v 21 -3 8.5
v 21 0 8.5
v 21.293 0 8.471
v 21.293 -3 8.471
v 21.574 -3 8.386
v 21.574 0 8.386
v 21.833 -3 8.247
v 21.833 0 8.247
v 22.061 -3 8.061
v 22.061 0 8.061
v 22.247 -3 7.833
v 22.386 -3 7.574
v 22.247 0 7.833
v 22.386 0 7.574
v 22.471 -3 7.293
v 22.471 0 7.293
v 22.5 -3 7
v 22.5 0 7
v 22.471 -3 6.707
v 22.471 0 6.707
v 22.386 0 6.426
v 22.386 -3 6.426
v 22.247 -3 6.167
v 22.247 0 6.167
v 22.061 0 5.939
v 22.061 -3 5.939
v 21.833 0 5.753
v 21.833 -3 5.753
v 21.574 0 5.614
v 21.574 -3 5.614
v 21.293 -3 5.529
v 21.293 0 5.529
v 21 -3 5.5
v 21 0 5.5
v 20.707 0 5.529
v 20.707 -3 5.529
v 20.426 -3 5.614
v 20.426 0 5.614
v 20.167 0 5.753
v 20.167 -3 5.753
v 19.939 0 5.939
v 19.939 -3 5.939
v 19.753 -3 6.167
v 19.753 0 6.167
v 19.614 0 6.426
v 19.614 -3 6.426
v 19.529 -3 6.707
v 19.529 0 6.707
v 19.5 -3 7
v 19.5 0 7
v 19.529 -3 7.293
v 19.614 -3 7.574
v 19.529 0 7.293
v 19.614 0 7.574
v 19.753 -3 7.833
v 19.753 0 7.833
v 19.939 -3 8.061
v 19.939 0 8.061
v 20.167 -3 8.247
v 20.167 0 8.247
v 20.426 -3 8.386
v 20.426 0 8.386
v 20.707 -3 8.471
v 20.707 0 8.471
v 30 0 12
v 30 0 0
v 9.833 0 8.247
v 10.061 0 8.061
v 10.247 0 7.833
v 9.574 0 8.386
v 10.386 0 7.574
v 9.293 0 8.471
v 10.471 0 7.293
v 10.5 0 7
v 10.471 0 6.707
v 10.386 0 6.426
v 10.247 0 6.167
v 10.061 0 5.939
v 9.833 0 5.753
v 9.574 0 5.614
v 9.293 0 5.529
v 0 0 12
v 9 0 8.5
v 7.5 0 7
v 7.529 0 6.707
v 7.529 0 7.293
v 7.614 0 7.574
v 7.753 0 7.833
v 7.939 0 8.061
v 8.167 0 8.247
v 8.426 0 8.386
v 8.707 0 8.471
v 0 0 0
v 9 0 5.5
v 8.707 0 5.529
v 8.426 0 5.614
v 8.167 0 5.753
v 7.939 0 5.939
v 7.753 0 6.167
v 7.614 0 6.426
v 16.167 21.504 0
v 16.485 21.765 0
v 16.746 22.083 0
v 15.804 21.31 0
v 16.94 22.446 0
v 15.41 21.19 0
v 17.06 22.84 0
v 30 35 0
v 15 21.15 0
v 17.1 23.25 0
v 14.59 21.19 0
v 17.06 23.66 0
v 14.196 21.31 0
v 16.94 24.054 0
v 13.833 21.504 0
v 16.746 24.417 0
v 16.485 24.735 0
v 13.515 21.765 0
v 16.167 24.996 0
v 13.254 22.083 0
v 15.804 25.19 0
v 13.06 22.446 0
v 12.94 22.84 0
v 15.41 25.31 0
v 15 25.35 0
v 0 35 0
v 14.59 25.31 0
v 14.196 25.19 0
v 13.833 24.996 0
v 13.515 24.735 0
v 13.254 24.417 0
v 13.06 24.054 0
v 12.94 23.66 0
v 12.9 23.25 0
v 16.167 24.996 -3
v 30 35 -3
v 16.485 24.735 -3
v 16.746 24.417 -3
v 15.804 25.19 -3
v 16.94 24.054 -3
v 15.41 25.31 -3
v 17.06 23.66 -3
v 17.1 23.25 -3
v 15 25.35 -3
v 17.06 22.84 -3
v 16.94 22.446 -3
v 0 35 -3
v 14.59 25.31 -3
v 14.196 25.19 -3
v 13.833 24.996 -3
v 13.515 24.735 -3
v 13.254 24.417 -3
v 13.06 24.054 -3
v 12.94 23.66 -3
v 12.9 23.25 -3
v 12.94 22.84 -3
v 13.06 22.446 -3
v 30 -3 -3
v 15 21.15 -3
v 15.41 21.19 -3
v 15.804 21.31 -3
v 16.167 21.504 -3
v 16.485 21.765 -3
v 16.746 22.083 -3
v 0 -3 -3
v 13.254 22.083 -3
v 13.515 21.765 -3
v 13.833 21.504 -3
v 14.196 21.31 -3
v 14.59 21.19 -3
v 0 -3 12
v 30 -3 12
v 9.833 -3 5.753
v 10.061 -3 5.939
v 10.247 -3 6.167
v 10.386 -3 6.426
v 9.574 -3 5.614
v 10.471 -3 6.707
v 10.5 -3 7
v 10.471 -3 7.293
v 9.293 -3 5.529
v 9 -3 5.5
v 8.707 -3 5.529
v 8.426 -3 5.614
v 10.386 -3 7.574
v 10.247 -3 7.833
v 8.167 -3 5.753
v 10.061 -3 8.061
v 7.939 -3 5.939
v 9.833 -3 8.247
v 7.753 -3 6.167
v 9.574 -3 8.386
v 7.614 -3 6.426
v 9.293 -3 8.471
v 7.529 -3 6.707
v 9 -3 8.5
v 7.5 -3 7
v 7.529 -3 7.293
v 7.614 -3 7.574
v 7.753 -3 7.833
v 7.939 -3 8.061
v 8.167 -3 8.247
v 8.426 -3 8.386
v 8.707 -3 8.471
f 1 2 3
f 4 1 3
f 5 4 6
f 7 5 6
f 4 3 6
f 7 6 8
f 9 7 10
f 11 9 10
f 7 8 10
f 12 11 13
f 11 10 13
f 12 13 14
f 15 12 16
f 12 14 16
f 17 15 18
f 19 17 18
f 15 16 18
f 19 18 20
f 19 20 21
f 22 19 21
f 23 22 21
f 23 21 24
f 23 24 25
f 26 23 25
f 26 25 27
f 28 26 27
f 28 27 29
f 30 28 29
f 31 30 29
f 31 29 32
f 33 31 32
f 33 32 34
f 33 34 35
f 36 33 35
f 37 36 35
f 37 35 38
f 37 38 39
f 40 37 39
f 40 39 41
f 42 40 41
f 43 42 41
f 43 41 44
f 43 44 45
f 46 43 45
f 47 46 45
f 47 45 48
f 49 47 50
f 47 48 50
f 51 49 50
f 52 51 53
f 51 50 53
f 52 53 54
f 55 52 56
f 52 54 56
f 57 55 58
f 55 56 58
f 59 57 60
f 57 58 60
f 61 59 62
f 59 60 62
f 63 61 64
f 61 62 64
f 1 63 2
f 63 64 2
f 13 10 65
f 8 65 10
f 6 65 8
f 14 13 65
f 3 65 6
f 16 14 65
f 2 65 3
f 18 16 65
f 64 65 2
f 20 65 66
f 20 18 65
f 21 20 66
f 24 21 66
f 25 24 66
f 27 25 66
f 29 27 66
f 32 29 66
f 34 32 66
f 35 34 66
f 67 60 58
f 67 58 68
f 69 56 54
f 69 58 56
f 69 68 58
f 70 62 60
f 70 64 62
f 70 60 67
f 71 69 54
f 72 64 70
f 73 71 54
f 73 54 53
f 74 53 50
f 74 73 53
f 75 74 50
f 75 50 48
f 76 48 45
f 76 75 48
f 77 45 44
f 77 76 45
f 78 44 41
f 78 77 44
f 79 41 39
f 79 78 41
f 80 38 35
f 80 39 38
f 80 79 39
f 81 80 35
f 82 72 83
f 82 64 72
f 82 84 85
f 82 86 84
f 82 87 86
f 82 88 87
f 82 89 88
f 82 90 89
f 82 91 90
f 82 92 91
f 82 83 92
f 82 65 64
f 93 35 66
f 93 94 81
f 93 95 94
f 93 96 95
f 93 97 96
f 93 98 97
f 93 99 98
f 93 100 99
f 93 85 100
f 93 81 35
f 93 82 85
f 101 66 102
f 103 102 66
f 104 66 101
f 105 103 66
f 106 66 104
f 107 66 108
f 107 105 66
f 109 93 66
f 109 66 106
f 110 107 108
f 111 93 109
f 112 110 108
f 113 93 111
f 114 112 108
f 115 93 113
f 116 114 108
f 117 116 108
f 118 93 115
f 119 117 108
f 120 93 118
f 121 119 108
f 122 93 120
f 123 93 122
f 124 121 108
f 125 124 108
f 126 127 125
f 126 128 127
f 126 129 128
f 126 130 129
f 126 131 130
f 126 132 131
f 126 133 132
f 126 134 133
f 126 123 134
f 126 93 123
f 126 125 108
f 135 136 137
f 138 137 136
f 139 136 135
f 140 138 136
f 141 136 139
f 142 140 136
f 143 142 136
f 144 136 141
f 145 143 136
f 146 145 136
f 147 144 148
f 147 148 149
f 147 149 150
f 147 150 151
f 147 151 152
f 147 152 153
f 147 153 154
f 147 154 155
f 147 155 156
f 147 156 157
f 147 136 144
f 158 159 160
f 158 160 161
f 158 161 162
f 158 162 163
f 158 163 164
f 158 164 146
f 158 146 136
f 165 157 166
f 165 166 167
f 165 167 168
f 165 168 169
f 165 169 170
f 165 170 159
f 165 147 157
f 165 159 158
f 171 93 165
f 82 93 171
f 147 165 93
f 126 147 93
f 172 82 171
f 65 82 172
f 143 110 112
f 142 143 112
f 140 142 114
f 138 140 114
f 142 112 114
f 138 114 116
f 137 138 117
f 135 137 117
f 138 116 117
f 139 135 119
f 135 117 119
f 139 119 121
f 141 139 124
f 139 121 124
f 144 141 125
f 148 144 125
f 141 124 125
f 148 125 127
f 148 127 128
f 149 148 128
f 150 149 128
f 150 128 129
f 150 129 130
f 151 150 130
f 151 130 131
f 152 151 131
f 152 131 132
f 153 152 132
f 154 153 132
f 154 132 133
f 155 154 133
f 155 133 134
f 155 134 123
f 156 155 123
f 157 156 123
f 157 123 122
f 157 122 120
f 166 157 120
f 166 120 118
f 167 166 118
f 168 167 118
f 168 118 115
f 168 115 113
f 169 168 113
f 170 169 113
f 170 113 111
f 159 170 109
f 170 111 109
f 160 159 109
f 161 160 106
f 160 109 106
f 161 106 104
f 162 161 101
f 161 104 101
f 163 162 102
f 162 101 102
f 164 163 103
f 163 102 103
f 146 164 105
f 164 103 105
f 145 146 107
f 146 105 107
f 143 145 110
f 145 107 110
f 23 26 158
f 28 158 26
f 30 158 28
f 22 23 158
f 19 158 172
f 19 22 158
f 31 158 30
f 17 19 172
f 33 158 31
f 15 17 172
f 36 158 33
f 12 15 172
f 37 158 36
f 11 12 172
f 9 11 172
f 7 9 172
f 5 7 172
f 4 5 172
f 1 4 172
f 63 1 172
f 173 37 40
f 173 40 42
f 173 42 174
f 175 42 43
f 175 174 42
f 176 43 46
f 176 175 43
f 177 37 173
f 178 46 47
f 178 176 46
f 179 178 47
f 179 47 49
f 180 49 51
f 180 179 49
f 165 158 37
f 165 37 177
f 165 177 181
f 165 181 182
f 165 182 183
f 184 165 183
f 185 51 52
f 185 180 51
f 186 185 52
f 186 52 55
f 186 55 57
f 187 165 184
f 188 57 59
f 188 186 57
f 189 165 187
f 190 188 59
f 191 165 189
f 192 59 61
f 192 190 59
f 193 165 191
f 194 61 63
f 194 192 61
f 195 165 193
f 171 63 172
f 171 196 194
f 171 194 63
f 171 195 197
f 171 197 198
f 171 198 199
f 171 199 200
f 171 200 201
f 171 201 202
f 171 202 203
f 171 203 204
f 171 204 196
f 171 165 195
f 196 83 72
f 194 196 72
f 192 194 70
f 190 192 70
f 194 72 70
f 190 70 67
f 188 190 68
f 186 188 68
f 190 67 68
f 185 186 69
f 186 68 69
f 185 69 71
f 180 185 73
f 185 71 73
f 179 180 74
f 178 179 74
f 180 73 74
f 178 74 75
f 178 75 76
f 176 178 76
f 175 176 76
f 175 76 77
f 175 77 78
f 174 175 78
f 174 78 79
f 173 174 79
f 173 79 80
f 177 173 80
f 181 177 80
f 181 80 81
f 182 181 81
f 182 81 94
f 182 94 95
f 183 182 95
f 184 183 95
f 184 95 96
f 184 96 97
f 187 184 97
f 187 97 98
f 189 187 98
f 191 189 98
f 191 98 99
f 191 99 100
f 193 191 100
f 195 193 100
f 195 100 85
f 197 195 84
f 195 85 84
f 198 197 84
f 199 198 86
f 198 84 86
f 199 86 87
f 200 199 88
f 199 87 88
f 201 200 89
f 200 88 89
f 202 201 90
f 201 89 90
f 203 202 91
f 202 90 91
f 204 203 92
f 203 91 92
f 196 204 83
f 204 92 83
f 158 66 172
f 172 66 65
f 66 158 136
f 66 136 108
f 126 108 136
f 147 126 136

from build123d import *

# Parameters (mm, degrees)
EXTRUDE_1_DEPTH     = 30
CUT_EXTRUDE_1_REACH = 59.879
SKETCH_2_R          = 1.5
SKETCH_2_W          = 30
SKETCH_2_H          = 10
SKETCH_3_R          = 2.1
CUT_EXTRUDE_2_DEPTH = 53.440442409
SKETCH_4_W          = 30
SKETCH_4_H          = 3
CUT_EXTRUDE_3_DEPTH = 13


with BuildPart() as part:
    # 草图1 → 凸台-拉伸1 (new body)
    with BuildSketch(Plane(origin=(0, 0, 0), x_dir=(0, 0, -1), z_dir=(1, 0, 0))):
        Polygon((0, 0), (0, 35), (3, 35), (3, -3), (-35, -3), (-35, 0), align=None)
    extrude(amount=EXTRUDE_1_DEPTH)

    # 草图2 → 切除-拉伸1 (cut, up to next)
    with BuildSketch(Plane(origin=(0, 0, 0), x_dir=(1, 0, 0), z_dir=(0, 1, 0)), mode=Mode.PRIVATE) as cut_extrude_1_sk1:
        with Locations(Location((9, -7, 0), (0, 0, 270))):
            Circle(SKETCH_2_R)
    cut_extrude_1_tool1 = extrude(cut_extrude_1_sk1.sketch, amount=-CUT_EXTRUDE_1_REACH, mode=Mode.PRIVATE) & part.part
    # 草图2 → 切除-拉伸1 (cut, up to next)
    with BuildSketch(Plane(origin=(0, 0, 0), x_dir=(1, 0, 0), z_dir=(0, 1, 0)), mode=Mode.PRIVATE) as cut_extrude_1_sk2:
        with Locations(Location((9, -19, 0), (0, 0, 270))):
            Circle(SKETCH_2_R)
    cut_extrude_1_tool2 = extrude(cut_extrude_1_sk2.sketch, amount=-CUT_EXTRUDE_1_REACH, mode=Mode.PRIVATE) & part.part
    # 草图2 → 切除-拉伸1 (cut, up to next)
    with BuildSketch(Plane(origin=(0, 0, 0), x_dir=(1, 0, 0), z_dir=(0, 1, 0)), mode=Mode.PRIVATE) as cut_extrude_1_sk3:
        with Locations(Location((21, -19, 0), (0, 0, 270))):
            Circle(SKETCH_2_R)
    cut_extrude_1_tool3 = extrude(cut_extrude_1_sk3.sketch, amount=-CUT_EXTRUDE_1_REACH, mode=Mode.PRIVATE) & part.part
    # 草图2 → 切除-拉伸1 (cut, up to next)
    with BuildSketch(Plane(origin=(0, 0, 0), x_dir=(1, 0, 0), z_dir=(0, 1, 0)), mode=Mode.PRIVATE) as cut_extrude_1_sk4:
        with Locations(Location((21, -7, 0), (0, 0, 270))):
            Circle(SKETCH_2_R)
    cut_extrude_1_tool4 = extrude(cut_extrude_1_sk4.sketch, amount=-CUT_EXTRUDE_1_REACH, mode=Mode.PRIVATE) & part.part
    # 草图2 → 切除-拉伸1 (cut, up to next)
    with BuildSketch(Plane(origin=(0, 0, 0), x_dir=(1, 0, 0), z_dir=(0, 1, 0)), mode=Mode.PRIVATE) as cut_extrude_1_sk5:
        with Locations((15, -30)):
            Rectangle(SKETCH_2_W, SKETCH_2_H)
    cut_extrude_1_tool5 = extrude(cut_extrude_1_sk5.sketch, amount=-CUT_EXTRUDE_1_REACH, mode=Mode.PRIVATE) & part.part
    add(cut_extrude_1_tool1.solids().sort_by_distance((9, 0, 7))[0], mode=Mode.SUBTRACT)
    add(cut_extrude_1_tool2.solids().sort_by_distance((9, 0, 19))[0], mode=Mode.SUBTRACT)
    add(cut_extrude_1_tool3.solids().sort_by_distance((21, 0, 19))[0], mode=Mode.SUBTRACT)
    add(cut_extrude_1_tool4.solids().sort_by_distance((21, 0, 7))[0], mode=Mode.SUBTRACT)
    add(cut_extrude_1_tool5.solids().sort_by_distance((15, 0, 30))[0], mode=Mode.SUBTRACT)

    # 草图3 → 切除-拉伸2 (cut, through all)
    with BuildSketch(Plane.XY):
        with Locations((15, 23.25)):
            Circle(SKETCH_3_R)
    extrude(amount=-CUT_EXTRUDE_2_DEPTH, mode=Mode.SUBTRACT)

    # 草图4 → 切除-拉伸3 (cut)
    with BuildSketch(Plane.XY.offset(25)):
        with Locations((15, -1.5)):
            Rectangle(SKETCH_4_W, SKETCH_4_H)
    extrude(amount=-CUT_EXTRUDE_3_DEPTH, mode=Mode.SUBTRACT)


solid = part.part
